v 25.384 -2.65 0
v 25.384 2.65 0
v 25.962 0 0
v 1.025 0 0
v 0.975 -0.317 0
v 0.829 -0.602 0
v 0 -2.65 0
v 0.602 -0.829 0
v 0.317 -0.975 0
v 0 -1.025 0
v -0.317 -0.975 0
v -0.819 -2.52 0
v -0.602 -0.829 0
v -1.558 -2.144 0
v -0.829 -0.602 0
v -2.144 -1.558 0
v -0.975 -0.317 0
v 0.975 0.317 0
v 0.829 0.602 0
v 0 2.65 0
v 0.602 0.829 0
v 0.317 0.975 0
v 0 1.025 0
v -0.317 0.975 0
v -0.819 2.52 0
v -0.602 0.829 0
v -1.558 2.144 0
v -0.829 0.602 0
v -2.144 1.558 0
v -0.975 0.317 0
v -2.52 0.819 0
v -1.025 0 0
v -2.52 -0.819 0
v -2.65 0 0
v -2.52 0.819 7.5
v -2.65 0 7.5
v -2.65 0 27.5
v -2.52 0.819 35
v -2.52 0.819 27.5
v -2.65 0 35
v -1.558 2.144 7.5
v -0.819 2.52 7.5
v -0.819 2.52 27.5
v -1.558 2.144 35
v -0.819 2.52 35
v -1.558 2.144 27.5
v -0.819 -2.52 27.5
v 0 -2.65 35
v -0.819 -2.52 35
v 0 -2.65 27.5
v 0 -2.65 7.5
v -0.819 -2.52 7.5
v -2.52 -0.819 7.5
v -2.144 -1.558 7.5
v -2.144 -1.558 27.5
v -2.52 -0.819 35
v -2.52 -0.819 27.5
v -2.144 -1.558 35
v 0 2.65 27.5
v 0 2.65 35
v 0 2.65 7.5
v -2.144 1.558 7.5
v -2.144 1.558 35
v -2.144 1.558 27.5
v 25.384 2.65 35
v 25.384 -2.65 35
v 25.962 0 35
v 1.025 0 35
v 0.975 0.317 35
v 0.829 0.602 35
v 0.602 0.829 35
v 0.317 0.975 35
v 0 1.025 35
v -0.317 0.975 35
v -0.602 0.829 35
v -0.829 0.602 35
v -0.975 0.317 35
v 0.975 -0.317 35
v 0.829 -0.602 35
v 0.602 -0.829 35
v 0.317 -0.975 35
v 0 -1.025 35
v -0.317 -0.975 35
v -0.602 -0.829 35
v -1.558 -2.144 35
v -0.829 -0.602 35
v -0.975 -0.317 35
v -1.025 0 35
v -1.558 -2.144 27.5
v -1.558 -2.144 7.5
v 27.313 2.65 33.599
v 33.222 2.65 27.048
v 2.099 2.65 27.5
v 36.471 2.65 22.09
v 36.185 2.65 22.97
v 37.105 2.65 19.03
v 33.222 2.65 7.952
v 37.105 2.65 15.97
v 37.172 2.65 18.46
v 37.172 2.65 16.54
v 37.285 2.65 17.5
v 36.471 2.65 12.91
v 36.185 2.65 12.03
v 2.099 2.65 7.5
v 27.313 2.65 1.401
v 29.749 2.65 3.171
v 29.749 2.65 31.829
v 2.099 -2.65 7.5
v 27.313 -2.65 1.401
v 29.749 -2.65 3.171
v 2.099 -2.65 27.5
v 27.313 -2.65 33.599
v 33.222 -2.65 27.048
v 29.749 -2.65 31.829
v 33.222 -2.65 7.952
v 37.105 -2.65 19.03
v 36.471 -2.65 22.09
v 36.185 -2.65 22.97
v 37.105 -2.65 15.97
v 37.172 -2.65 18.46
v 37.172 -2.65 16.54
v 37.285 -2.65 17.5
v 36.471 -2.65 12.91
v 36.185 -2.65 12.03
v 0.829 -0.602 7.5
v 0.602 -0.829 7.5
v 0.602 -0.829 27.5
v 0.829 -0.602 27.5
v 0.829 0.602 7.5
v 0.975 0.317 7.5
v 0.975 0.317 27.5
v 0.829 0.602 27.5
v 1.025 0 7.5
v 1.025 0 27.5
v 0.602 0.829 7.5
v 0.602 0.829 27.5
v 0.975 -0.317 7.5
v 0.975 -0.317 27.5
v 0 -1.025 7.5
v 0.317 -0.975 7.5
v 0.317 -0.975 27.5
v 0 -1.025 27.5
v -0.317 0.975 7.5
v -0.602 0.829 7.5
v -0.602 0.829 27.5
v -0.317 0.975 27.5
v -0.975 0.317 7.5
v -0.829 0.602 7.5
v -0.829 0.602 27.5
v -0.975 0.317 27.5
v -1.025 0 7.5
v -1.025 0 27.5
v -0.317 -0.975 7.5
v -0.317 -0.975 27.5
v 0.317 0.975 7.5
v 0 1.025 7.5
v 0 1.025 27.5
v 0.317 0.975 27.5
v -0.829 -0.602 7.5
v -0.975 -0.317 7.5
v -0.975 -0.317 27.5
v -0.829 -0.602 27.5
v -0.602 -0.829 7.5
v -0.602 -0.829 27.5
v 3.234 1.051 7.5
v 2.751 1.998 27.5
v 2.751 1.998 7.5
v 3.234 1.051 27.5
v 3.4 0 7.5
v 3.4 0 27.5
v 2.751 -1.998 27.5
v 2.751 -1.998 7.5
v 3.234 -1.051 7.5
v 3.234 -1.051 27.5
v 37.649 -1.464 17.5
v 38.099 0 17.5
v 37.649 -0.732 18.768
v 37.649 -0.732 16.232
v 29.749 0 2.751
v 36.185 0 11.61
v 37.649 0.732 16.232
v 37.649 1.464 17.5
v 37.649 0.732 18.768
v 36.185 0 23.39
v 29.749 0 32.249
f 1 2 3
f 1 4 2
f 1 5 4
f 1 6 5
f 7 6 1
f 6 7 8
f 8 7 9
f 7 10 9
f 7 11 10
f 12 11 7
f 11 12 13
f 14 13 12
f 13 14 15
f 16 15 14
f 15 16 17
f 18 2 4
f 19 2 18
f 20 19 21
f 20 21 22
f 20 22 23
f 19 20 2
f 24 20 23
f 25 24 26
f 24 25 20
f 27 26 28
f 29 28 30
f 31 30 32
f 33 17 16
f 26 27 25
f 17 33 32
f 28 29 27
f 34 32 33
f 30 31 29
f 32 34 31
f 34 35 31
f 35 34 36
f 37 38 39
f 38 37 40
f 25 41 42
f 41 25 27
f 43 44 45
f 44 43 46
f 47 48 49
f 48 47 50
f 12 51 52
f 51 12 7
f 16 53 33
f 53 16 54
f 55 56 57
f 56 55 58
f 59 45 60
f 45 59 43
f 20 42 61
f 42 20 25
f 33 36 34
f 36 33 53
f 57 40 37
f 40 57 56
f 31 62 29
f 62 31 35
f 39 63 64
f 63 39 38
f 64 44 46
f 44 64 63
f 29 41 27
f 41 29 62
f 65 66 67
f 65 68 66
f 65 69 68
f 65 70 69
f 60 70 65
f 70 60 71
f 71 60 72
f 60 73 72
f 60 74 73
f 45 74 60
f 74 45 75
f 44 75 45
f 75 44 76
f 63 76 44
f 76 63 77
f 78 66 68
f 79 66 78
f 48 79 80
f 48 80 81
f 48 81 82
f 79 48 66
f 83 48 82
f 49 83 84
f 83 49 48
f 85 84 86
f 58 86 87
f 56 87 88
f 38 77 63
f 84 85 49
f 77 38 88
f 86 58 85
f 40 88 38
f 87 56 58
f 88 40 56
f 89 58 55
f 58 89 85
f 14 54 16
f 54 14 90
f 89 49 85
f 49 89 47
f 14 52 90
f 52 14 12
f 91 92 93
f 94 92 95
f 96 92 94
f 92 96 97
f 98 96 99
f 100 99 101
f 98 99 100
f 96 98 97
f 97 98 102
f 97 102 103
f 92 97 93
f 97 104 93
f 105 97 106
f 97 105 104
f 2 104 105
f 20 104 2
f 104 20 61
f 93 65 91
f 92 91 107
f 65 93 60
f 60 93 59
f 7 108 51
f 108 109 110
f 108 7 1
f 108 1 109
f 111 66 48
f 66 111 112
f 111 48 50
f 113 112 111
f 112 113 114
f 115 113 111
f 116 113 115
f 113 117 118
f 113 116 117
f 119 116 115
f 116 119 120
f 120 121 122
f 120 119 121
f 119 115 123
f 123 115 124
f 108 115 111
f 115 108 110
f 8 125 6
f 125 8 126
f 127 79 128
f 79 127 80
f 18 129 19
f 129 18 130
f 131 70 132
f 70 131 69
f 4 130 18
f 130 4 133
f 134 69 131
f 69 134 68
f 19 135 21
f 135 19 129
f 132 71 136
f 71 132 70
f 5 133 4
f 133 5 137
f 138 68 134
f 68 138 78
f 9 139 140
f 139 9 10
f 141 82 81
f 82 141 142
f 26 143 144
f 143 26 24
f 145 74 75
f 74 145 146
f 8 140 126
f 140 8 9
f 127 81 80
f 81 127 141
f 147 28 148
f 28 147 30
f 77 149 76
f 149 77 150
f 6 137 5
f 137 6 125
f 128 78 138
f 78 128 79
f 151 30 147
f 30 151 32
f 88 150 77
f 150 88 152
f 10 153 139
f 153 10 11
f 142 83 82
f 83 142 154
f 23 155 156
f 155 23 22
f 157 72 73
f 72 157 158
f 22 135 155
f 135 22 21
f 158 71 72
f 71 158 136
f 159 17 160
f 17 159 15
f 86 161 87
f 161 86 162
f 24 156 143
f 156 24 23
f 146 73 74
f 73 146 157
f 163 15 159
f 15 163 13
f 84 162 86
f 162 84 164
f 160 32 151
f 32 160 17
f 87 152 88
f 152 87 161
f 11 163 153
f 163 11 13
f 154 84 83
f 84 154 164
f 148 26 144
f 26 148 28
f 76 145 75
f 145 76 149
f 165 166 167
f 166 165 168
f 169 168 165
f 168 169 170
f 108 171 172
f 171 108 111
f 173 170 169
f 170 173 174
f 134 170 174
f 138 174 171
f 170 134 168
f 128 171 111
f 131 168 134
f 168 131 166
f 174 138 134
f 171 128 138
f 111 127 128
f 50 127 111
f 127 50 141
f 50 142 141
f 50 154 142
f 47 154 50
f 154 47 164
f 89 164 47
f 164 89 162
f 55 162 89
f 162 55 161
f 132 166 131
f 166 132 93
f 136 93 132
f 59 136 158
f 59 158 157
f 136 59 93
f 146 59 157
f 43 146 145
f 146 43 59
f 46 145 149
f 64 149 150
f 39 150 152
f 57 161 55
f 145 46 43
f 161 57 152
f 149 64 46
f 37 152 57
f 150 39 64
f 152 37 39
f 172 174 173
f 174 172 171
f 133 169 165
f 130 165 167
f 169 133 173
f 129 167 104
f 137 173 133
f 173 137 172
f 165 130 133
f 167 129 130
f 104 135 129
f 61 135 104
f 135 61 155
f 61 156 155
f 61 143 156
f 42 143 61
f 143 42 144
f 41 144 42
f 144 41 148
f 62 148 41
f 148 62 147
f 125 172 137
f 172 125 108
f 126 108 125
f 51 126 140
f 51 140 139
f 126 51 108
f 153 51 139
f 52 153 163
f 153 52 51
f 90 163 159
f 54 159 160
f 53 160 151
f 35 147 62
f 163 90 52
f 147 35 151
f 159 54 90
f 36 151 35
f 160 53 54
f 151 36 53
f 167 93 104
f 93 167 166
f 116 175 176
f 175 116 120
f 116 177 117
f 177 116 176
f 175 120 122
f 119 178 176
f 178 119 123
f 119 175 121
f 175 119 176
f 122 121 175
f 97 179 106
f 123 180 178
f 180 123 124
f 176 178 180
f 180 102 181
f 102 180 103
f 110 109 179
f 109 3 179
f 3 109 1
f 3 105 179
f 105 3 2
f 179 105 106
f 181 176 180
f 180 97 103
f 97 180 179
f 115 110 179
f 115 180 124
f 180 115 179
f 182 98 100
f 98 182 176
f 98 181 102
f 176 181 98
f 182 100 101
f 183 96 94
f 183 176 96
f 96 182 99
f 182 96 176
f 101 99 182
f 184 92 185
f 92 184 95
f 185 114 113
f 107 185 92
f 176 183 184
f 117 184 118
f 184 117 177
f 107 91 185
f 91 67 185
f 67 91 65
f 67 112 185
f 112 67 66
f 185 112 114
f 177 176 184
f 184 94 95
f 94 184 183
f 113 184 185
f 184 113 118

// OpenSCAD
// file: end.scad
include <belt_configuration.scad>

module end()
{
  difference()
  {
    // main part
    union()
    {
      cylinder(r=belt_thickness / 2, h=belt_height);

      translate([h_width - belt_thickness,0,0])
        cylinder(r=belt_thickness / 2, h=belt_height);

      translate([0, -belt_thickness / 2, 0])
        cube([h_width-belt_thickness, belt_thickness, belt_height]);
    }

    // left pin hole
    translate([0,0,-mo])
      cylinder(r=pin_diameter / 2, h=belt_height + 2 * mo);
  
    // left cut
    translate([0,0, (belt_height - link_depth_height)/2])
      cylinder(r=(belt_thickness+link_tolerance) / 2, h=link_depth_height);
  }
}

end();
// file: belt_configuration.scad
belt_thickness = 5.3;
belt_height = 35;

buckle_thickness = 2;
buckle_length = 30;


cross_width = 25;
h_width = 25;
peak_width = 10;

link_height = 20;

pin_diameter = 2.05;

pin_tolerance = 0.2;

hole_diameter = 3;

link_tolerance = 1.5;
link_depth = pin_diameter + 2*link_tolerance;
link_depth_height = 20;


$fn = 20;
mo = 0.01;
// main file
include<belt_configuration.scad>

use <end.scad>

module peak()
{
  union()
  {
    end();

    translate([peak_width/2,0,belt_height/2])
    rotate([0,90,0])
    intersection()
    {
      intersection_for(n = [1 : 6])
      {
        rotate([0, 0, n * 60])
        {
            translate([10,0,0])
            sphere(r=belt_height);
        }
      }
      translate([-belt_height/2,-belt_thickness/2,0])
      cube([belt_height, belt_thickness, 50]);
    }
  }
}

peak();
